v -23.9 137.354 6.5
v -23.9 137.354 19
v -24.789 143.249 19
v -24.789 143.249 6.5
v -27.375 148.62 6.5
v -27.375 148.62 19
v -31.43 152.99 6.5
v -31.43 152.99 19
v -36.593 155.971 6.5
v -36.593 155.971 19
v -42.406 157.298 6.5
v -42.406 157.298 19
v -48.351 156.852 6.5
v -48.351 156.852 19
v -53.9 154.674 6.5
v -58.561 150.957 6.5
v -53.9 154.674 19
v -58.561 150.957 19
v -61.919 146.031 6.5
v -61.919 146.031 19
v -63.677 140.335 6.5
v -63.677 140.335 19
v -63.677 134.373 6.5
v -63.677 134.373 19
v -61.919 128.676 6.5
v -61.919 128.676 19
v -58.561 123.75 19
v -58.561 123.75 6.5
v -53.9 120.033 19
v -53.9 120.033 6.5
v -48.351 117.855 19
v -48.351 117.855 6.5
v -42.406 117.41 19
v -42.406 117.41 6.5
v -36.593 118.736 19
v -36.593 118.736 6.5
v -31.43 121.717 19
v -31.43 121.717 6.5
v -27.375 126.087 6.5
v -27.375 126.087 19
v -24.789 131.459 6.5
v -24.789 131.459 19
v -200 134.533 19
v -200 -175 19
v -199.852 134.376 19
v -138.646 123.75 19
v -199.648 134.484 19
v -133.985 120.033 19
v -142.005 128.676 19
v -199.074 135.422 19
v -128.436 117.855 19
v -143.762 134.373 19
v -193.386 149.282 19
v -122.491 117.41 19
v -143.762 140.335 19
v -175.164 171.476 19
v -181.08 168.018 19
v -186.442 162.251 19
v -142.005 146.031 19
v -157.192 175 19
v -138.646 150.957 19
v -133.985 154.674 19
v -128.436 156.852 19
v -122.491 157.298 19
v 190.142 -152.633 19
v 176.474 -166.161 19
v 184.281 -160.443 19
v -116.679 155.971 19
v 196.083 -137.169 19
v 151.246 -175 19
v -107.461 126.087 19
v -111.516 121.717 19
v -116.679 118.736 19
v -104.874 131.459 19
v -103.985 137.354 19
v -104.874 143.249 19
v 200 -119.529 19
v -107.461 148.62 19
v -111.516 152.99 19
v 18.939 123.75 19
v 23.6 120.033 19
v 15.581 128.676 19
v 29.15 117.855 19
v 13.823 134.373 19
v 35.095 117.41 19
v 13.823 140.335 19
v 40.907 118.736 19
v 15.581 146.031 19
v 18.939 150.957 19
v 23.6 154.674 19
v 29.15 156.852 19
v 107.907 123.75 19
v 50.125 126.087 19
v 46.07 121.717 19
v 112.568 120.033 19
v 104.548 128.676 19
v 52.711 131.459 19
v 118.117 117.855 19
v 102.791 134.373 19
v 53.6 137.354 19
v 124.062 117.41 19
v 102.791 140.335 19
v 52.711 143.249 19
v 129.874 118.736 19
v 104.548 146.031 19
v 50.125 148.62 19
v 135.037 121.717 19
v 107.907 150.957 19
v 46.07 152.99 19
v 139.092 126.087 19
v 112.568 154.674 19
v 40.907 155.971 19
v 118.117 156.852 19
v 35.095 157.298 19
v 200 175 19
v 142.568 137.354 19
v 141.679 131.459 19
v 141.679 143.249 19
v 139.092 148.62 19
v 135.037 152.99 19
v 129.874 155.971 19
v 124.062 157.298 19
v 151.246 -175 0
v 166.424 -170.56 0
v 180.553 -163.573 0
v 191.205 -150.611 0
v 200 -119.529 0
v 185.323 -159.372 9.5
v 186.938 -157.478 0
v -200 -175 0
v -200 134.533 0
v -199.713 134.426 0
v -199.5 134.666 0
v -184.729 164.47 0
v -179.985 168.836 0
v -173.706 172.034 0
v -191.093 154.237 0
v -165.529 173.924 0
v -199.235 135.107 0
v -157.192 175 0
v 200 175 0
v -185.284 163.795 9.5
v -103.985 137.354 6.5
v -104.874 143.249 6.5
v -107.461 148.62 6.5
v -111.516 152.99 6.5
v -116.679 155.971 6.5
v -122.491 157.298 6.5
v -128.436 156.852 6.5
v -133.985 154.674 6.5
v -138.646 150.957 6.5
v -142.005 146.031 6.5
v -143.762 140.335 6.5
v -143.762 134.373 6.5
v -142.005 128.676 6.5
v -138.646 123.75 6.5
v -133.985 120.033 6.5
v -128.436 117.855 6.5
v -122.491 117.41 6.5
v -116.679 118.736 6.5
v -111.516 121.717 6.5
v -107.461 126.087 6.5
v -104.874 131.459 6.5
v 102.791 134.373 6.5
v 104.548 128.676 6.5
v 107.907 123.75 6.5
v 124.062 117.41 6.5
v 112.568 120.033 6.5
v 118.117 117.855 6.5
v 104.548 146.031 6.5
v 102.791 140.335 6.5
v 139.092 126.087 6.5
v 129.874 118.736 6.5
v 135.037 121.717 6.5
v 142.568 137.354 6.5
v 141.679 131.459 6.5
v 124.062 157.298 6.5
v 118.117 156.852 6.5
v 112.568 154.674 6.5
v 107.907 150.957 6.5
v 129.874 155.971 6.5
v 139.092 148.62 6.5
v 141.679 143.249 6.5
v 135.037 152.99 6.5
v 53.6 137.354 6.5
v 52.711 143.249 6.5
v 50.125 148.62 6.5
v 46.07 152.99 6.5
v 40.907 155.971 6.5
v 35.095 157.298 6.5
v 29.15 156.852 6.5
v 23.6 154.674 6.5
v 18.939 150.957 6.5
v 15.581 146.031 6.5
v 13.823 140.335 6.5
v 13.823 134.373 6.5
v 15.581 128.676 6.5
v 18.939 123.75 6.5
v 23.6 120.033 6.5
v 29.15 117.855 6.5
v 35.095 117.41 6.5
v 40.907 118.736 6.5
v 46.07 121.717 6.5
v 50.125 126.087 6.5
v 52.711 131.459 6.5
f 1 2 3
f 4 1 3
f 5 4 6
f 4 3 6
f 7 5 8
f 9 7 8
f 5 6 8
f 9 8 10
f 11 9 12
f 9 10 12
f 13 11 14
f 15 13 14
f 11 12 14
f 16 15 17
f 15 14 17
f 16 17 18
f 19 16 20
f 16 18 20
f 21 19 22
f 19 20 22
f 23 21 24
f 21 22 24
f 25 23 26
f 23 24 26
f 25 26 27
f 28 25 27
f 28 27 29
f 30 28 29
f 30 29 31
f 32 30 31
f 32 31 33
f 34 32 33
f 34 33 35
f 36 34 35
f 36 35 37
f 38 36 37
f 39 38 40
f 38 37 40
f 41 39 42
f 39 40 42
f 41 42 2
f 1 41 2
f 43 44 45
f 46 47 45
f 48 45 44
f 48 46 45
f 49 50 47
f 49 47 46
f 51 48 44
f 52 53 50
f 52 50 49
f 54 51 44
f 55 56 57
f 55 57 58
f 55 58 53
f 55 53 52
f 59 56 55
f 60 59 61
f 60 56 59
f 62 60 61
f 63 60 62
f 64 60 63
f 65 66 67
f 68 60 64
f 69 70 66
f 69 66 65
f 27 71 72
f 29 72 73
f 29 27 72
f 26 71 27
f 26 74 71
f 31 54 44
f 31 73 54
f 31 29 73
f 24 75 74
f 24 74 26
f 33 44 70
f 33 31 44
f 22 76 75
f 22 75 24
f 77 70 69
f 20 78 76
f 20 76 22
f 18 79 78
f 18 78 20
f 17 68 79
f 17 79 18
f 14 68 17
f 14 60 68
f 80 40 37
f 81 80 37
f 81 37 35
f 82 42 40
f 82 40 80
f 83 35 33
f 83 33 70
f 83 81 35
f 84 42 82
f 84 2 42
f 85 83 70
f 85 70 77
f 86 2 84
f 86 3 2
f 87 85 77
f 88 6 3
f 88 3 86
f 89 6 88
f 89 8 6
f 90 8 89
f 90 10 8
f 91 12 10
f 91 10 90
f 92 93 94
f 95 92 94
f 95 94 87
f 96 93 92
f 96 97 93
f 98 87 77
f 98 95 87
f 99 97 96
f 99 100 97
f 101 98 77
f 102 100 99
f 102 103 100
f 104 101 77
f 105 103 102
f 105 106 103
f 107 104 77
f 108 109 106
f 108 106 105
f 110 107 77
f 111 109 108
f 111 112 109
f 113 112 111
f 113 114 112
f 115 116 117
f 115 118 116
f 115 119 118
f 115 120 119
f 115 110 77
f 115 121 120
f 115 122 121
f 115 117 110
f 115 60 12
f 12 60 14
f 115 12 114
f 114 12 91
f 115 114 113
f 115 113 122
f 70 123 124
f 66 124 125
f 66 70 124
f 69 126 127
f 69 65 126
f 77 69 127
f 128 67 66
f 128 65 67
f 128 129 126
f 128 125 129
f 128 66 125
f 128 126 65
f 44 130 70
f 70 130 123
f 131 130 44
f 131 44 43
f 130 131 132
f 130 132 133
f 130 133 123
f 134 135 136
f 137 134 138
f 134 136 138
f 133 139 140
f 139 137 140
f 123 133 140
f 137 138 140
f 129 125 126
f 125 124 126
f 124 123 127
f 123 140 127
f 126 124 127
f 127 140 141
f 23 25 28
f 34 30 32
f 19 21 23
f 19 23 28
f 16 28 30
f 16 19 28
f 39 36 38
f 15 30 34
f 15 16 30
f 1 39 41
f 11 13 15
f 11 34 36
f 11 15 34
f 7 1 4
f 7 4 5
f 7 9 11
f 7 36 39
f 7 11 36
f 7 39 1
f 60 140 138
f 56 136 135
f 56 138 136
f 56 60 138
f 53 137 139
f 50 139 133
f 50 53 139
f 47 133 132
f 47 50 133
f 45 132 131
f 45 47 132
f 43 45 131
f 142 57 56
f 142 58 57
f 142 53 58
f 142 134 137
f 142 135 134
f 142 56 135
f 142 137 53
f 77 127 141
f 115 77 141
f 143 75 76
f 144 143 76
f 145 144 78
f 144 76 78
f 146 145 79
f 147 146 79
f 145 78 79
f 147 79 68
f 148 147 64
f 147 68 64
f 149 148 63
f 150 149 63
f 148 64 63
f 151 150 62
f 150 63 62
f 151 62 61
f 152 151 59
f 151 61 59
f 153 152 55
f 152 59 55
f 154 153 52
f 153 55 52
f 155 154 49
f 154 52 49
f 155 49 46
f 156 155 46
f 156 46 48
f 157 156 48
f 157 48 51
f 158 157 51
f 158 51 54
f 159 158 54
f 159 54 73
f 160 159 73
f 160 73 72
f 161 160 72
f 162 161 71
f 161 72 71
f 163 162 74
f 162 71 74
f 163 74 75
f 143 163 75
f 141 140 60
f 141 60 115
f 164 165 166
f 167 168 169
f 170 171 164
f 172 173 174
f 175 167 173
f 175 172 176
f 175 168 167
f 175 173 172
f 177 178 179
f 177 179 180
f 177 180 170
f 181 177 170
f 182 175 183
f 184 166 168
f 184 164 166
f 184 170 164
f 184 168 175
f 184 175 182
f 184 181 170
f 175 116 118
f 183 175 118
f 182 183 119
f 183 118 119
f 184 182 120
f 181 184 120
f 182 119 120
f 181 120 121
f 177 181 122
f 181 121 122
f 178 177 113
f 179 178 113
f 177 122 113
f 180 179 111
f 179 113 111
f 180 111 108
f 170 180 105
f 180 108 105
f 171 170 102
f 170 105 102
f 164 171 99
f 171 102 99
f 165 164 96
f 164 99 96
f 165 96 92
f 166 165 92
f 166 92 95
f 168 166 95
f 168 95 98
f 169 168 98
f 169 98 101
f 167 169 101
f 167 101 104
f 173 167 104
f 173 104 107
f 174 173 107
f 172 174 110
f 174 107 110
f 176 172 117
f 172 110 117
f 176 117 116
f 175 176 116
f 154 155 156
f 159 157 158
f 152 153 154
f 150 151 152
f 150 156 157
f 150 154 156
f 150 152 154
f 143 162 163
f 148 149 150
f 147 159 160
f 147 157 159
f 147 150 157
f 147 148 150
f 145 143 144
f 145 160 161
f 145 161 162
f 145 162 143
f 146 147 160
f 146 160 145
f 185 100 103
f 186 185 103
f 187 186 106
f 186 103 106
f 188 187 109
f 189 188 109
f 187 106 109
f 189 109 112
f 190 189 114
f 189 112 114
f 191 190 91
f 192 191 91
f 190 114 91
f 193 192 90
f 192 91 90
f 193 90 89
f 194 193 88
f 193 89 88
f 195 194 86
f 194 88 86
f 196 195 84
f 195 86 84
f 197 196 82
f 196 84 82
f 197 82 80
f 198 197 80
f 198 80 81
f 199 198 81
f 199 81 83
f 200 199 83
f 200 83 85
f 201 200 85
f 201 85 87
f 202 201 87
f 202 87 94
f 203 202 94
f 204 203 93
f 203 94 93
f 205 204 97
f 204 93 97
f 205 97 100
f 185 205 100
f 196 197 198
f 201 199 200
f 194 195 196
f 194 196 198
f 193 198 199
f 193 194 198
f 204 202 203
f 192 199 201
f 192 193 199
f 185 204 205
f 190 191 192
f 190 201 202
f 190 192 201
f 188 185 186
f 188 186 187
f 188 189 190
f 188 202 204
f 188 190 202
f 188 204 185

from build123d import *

# Parameters (mm, degrees)
F0_W     = 400
F0_H     = 350
F1_DEPTH = 19
F4_DEPTH = 19.001
F2_R     = 20
F5_DEPTH = 12.5
F6_DEPTH = 19.0010001


with BuildPart() as f1:
    # F0 (on Top) → F1 (new body)
    with BuildSketch(Plane.XY):
        Rectangle(F0_W, F0_H)
    extrude(amount=F1_DEPTH)

    # F3 (on face) → F4 (cut, through all)
    with BuildSketch(Plane.XY.offset(19)):
        with BuildLine():
            add(Edge.make_bspline(
                [(151.2464284897, -175), (164.2430137507, -171.5517342548), (191.0711310333, -164.4336739354), (196.9625921733, -134.8047557028), (200, -119.5292398334)],
                knots=[0, 0, 0, 0, 0.484438961, 1, 1, 1, 1], degree=3))
            Line((151.2464284897, -175), (200, -175))
            Line((200, -175), (200, -119.5292398334))
        make_face()
    extrude(amount=-F4_DEPTH, mode=Mode.SUBTRACT)

    # F2 (on face) → F5 (cut, symmetric)
    with BuildSketch(Plane.XY.offset(19)):
        with Locations((122.5676462054, 137.3537778854)):
            Circle(F2_R)
        with Locations((33.6000025272, 137.3537778854)):
            Circle(F2_R)
        with Locations((-43.9001172781, 137.3537778854)):
            Circle(F2_R)
        with Locations((-123.9853724837, 137.3537778854)):
            Circle(F2_R)
    extrude(amount=F5_DEPTH, both=True, mode=Mode.SUBTRACT)

    # F2 (on face) → F6 (cut, through all)
    with BuildSketch(Plane.XY.offset(19)):
        with BuildLine():
            add(Edge.make_bspline(
                [(-157.191619277, 175), (-167.0547662133, 173.6002362151), (-188.1240063271, 173.8063038374), (-199.1158279923, 132.3396944698), (-200, 134.5333755016)],
                knots=[0, 0, 0, 0, 0.4262547571, 0.869833783, 0.869833783, 0.869833783, 0.869833783], degree=3))
            Line((-157.191619277, 175), (-200, 175))
            Line((-200, 175), (-200, 137.3537778854))
            Line((-200, 137.3537778854), (-200, 134.5333755016))
        make_face()
    extrude(amount=-F6_DEPTH, mode=Mode.SUBTRACT)


solid = f1.part
